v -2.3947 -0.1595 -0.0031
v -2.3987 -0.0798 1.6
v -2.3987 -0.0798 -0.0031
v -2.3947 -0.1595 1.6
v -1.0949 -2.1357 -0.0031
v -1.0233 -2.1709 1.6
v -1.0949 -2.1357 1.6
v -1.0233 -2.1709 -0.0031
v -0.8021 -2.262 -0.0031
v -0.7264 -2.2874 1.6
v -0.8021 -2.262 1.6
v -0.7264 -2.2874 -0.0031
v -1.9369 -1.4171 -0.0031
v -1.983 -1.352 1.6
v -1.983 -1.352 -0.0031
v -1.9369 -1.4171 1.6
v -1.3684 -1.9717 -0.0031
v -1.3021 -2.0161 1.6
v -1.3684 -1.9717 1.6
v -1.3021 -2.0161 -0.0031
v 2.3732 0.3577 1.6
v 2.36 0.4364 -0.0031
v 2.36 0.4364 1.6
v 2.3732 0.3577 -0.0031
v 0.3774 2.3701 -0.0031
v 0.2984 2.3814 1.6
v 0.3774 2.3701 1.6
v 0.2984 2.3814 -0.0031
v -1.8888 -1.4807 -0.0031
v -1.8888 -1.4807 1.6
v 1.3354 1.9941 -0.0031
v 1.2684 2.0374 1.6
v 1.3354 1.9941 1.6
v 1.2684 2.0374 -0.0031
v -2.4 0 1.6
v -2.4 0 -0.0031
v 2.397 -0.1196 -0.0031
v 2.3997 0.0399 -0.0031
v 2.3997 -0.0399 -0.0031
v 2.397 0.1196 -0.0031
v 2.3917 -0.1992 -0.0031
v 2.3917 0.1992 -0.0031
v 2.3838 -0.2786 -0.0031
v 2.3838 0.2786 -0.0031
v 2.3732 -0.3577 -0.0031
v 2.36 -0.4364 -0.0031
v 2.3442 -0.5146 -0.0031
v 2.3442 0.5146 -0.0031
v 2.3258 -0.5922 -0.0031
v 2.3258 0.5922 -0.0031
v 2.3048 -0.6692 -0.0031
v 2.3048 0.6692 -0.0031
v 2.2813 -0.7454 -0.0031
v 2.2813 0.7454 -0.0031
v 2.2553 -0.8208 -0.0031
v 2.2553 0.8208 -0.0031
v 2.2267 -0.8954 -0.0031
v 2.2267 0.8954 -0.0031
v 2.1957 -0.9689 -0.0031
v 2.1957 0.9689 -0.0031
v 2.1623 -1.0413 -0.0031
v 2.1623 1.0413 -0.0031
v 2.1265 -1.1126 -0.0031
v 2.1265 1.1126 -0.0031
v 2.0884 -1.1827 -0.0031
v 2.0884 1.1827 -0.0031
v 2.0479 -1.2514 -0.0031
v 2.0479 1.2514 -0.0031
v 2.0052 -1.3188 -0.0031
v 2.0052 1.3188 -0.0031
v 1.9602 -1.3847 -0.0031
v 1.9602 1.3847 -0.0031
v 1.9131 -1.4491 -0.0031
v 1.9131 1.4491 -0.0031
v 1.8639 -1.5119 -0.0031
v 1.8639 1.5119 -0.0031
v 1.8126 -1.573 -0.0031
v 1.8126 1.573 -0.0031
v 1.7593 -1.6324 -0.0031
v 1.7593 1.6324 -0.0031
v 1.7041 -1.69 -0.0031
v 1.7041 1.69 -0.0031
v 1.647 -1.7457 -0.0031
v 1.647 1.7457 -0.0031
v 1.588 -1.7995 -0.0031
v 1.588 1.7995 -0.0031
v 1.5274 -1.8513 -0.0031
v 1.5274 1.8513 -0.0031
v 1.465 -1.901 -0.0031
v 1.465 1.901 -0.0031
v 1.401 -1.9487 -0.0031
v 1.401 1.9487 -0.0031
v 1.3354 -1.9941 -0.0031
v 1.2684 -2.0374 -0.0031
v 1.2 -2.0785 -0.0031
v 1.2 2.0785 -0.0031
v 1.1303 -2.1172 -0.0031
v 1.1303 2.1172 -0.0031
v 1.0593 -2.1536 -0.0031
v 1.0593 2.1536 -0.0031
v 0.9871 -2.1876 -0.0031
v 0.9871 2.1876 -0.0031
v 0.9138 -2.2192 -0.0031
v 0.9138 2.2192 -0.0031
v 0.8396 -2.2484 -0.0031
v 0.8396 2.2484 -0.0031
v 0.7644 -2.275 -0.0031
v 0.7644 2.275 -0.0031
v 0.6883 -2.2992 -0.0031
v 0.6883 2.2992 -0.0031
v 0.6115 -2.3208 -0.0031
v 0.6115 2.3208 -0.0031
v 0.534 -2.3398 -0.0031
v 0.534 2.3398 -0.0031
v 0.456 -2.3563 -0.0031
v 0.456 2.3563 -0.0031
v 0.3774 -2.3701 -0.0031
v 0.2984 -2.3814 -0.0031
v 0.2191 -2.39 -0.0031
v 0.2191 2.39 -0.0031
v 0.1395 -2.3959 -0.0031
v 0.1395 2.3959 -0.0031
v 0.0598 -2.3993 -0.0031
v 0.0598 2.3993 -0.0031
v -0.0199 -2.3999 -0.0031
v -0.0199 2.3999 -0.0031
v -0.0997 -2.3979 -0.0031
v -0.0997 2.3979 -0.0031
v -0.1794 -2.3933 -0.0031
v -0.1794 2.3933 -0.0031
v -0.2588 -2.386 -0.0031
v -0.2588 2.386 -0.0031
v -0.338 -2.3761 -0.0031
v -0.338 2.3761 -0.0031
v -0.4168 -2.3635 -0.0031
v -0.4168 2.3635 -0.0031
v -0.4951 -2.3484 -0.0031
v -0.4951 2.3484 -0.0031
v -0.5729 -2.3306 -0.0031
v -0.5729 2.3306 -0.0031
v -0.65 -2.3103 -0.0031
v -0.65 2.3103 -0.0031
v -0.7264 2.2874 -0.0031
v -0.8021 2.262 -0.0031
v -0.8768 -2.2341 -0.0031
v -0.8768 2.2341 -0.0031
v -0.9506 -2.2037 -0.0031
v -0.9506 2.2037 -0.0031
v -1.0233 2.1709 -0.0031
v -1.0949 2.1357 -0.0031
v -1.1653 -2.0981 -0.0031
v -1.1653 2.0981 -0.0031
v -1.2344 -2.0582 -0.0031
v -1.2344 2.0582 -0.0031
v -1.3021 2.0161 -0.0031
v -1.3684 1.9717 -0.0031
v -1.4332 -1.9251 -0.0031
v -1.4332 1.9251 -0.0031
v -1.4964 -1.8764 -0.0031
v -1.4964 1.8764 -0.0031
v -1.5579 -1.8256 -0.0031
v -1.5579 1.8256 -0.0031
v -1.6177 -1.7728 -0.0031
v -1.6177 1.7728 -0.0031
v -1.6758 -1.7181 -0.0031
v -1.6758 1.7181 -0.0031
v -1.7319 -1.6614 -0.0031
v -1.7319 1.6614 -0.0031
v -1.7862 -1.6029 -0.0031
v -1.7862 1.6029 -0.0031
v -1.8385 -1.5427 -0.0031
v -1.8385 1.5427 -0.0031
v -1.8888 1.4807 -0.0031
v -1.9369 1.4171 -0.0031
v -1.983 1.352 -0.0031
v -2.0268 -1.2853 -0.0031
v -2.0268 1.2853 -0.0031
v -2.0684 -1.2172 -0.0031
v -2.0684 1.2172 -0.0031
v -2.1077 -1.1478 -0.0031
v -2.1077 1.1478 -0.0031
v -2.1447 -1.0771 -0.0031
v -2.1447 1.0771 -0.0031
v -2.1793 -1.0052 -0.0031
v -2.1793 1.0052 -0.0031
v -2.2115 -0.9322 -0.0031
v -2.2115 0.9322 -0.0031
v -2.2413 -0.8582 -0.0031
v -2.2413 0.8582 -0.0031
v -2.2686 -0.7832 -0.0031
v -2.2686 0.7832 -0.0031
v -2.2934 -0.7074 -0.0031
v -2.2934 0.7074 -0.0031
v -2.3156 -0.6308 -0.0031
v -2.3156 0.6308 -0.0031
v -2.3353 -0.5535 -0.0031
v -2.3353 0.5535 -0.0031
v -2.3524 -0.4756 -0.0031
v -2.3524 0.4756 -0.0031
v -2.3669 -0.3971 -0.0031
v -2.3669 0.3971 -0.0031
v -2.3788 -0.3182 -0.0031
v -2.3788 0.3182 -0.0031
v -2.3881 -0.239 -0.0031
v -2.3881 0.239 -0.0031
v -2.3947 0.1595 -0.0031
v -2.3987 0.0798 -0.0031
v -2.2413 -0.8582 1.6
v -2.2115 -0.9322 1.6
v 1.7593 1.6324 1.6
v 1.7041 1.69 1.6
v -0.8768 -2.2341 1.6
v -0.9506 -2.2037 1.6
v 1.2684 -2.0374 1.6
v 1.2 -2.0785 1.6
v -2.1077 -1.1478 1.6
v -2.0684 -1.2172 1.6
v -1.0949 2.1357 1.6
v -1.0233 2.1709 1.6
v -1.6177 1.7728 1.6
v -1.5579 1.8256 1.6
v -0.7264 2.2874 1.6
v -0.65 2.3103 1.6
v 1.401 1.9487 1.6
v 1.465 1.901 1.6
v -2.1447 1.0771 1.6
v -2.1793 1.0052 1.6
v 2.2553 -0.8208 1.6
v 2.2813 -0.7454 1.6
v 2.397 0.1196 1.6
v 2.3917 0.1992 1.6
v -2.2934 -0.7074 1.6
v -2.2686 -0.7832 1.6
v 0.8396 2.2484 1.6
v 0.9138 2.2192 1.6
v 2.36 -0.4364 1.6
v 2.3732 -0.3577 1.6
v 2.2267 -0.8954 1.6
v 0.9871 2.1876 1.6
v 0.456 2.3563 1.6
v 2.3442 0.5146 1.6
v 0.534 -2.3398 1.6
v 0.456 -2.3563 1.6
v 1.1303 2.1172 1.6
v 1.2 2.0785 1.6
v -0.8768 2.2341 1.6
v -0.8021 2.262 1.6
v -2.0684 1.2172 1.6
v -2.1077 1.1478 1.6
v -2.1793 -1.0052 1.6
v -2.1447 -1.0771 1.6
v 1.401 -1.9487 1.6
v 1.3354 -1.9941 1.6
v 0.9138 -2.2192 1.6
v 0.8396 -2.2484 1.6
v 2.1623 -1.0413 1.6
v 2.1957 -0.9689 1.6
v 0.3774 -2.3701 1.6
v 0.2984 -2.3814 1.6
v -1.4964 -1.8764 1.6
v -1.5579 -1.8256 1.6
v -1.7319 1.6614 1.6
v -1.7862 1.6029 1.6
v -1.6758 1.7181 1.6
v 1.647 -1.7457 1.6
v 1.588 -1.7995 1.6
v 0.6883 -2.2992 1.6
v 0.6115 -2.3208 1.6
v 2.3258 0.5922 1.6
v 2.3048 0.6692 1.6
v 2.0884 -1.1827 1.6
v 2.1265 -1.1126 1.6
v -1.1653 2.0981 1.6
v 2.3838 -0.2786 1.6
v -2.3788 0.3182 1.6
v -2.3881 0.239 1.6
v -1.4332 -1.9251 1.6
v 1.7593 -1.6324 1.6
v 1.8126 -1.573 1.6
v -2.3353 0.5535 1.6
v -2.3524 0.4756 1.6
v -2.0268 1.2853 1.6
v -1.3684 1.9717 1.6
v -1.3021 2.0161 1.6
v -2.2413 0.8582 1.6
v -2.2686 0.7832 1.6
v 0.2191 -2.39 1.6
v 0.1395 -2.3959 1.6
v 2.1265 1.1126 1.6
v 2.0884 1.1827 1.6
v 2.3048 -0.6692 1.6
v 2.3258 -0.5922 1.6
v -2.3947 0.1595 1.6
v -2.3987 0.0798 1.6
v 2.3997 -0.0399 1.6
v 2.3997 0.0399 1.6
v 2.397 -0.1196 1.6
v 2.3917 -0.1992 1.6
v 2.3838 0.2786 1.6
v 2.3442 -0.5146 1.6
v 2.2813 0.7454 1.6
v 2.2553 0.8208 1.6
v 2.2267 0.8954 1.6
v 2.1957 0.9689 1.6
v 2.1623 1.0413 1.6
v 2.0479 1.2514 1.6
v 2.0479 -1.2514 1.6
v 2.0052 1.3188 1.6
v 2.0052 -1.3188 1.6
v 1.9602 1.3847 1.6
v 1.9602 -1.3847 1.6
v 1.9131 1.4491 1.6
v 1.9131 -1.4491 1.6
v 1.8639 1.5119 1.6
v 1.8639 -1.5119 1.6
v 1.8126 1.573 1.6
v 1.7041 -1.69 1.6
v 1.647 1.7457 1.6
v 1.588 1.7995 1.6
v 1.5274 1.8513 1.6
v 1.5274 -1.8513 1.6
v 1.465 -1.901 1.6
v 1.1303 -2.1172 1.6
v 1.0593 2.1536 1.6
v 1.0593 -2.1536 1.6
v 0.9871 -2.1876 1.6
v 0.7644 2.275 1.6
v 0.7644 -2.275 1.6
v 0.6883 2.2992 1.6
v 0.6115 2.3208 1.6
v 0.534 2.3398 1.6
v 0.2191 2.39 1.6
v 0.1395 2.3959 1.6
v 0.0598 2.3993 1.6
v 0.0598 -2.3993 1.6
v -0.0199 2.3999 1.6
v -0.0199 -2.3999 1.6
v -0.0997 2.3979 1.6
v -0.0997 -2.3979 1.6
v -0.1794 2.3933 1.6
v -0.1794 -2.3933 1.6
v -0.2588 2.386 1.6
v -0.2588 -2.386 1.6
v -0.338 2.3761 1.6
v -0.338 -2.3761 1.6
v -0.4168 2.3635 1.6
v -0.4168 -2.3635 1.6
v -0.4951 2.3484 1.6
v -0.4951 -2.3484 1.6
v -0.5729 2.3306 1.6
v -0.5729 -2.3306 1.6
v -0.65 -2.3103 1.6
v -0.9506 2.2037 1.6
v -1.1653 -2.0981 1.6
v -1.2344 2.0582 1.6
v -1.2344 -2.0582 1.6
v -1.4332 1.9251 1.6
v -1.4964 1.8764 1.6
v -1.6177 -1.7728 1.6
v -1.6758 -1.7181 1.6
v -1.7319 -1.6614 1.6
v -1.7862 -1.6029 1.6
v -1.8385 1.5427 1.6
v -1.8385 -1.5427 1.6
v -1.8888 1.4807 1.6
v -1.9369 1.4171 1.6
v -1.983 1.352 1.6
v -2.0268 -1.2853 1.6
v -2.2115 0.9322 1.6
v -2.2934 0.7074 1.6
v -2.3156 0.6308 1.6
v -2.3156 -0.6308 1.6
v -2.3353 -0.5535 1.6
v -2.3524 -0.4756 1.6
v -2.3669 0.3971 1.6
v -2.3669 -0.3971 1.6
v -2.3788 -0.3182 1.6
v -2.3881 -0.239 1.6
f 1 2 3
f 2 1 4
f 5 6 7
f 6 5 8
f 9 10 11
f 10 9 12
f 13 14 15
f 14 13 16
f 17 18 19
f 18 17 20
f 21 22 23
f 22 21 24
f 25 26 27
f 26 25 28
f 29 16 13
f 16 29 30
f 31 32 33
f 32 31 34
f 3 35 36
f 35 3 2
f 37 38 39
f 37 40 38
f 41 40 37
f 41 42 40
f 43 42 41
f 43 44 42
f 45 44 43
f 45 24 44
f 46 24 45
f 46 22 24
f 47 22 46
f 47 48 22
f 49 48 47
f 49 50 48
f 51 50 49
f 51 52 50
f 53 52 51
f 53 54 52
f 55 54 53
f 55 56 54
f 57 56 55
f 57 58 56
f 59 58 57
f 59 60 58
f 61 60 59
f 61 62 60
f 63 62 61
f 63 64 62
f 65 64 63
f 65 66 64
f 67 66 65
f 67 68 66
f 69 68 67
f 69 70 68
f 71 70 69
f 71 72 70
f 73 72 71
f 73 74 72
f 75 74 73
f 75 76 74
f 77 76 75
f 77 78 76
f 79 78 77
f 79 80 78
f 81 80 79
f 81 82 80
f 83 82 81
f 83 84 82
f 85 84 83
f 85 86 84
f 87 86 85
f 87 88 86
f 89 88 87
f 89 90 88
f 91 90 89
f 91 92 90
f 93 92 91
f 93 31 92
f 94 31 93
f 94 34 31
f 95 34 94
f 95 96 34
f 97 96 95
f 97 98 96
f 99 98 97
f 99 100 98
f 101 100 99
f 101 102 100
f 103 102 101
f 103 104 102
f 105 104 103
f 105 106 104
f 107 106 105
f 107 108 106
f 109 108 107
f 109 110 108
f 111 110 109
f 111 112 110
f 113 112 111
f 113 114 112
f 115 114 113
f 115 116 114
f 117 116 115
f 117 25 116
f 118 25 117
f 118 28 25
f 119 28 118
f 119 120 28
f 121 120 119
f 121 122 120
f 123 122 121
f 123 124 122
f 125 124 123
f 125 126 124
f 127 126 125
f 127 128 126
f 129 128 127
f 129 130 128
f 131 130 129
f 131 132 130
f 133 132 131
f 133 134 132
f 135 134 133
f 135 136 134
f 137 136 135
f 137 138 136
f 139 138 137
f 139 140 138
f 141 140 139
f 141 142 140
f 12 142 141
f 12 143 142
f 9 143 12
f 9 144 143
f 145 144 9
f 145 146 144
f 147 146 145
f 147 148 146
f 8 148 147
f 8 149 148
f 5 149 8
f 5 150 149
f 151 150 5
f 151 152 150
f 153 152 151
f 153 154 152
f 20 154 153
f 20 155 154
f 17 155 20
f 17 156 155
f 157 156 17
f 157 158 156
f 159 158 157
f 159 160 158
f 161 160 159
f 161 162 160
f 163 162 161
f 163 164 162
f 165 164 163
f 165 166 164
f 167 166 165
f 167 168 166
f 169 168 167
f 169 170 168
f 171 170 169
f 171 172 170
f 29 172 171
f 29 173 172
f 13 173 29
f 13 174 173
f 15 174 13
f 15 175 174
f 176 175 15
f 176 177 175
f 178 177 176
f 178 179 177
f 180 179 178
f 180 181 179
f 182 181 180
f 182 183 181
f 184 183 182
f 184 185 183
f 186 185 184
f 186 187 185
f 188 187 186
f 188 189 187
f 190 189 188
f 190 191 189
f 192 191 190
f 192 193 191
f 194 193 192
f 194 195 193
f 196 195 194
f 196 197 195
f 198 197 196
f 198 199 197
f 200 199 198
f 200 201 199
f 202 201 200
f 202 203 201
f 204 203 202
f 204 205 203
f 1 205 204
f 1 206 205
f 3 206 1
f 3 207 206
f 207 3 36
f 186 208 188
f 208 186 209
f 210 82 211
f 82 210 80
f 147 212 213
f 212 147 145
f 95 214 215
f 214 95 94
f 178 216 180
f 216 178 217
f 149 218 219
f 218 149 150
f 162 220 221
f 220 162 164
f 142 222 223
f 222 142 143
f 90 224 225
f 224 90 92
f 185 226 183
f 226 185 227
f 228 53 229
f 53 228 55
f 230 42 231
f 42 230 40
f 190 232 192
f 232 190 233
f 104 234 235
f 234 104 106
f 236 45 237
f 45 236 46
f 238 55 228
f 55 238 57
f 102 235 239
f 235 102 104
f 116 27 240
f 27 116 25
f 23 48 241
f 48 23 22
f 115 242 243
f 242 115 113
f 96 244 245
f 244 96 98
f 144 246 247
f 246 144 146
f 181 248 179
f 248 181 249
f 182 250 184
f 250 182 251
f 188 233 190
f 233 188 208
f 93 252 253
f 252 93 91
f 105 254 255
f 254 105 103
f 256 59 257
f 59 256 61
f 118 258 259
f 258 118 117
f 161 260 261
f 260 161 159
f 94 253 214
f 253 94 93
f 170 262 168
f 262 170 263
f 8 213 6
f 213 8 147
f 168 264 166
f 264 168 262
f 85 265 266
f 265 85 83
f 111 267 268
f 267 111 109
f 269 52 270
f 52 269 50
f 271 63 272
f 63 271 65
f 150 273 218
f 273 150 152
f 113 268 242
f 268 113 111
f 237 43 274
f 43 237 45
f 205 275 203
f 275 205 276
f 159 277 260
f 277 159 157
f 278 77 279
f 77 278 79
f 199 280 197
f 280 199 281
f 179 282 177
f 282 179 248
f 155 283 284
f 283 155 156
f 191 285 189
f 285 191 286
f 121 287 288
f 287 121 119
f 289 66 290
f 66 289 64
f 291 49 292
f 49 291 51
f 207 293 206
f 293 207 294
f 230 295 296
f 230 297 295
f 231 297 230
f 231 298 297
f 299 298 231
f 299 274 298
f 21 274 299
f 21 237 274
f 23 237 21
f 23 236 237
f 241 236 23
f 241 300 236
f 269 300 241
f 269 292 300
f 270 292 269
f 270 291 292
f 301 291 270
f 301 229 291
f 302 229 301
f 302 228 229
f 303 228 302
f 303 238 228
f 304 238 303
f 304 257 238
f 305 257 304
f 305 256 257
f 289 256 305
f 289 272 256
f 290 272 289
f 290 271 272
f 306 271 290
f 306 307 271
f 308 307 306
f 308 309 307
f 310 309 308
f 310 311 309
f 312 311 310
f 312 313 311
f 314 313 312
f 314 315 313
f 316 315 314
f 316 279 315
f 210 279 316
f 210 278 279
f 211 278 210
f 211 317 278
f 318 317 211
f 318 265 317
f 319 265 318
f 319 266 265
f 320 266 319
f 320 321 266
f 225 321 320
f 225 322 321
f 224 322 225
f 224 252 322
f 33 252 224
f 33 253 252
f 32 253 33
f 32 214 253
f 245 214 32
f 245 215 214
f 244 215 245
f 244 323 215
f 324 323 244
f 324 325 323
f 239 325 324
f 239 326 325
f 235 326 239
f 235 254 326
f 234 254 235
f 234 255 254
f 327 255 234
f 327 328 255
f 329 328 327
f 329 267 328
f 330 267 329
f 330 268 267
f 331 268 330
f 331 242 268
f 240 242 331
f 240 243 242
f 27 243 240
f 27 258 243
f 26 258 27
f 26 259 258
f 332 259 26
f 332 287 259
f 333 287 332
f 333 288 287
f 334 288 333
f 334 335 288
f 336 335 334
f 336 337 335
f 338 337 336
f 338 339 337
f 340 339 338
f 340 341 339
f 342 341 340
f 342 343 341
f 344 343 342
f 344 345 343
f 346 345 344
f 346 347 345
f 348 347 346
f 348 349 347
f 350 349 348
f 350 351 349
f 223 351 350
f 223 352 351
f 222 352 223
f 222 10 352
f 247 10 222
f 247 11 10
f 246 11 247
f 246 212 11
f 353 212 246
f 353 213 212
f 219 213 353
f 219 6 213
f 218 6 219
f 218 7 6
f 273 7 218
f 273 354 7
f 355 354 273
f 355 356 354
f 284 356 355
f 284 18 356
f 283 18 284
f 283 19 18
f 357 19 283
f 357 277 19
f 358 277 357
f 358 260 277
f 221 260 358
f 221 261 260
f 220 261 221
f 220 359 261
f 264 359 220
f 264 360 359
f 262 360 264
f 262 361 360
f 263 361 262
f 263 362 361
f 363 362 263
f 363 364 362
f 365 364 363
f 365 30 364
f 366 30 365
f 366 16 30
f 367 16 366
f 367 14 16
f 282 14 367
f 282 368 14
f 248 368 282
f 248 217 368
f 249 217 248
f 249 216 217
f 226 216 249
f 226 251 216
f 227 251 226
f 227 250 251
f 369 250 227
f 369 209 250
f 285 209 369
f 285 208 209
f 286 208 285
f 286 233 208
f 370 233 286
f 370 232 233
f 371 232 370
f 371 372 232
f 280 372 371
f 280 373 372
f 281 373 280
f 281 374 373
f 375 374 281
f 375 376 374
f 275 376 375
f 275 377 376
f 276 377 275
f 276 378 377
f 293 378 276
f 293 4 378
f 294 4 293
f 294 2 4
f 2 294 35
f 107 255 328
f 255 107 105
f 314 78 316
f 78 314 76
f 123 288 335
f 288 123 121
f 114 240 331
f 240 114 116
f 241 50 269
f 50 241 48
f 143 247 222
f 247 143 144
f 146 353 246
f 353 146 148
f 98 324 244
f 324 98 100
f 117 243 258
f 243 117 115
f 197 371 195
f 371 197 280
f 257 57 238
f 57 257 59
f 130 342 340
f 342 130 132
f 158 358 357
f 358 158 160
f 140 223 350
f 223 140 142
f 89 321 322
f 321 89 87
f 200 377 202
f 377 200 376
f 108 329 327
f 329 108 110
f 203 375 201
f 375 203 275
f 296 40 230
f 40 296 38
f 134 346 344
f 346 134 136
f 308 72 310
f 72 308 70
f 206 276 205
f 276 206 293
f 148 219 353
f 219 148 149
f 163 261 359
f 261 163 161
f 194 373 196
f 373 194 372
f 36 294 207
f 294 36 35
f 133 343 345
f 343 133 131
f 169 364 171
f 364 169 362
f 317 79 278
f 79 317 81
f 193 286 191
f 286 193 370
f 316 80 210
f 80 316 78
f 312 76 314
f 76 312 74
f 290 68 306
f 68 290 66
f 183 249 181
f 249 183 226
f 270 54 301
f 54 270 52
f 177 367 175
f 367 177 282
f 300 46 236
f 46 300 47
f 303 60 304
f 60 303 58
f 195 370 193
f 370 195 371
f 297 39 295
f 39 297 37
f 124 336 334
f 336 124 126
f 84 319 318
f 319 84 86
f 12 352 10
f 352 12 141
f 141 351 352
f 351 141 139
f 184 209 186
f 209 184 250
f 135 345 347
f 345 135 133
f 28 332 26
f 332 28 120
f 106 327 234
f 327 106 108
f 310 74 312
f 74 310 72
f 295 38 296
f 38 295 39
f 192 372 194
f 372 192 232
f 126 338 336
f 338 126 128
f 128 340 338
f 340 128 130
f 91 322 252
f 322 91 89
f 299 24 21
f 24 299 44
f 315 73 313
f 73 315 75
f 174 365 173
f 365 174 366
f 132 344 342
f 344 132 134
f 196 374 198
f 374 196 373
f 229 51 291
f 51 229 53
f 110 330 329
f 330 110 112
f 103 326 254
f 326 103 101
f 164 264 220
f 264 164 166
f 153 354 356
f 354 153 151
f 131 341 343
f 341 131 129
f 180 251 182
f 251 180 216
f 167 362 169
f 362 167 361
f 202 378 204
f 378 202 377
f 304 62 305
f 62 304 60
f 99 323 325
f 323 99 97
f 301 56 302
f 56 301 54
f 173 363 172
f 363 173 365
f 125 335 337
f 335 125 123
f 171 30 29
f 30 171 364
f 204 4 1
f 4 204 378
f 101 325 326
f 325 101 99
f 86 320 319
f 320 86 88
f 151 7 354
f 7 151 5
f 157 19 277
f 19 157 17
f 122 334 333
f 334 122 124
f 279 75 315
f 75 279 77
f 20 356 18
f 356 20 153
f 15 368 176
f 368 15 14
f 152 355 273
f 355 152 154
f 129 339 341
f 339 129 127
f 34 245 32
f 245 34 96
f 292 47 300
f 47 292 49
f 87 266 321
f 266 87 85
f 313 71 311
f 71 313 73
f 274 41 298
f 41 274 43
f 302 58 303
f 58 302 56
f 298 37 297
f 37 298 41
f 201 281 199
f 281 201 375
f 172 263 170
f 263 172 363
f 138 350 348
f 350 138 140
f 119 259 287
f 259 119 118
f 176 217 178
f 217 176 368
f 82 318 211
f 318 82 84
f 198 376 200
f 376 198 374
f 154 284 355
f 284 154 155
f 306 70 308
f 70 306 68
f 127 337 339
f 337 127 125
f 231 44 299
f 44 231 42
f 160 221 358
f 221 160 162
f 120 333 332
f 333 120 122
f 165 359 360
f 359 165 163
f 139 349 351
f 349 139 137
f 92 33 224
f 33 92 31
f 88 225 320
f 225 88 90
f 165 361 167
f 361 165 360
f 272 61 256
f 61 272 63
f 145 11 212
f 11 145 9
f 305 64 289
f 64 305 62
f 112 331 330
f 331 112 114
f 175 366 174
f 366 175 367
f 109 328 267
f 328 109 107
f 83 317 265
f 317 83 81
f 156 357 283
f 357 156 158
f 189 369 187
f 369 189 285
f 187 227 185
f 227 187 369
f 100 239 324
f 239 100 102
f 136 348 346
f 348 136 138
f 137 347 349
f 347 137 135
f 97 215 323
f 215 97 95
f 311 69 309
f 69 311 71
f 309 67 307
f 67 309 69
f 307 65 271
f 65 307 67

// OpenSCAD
// file: ../p/4-4edge.scad
use <../lib.scad>
$fa=1; $fs=0.2;
function ldraw_lib__4_4edge(realsolid=false) = [
// 0 Circle 1.0
// 0 Name: 4-4edge.dat
// 0 Author: James Jessiman
// 0 !LDRAW_ORG Primitive UPDATE 2017-01
// 0 !LICENSE Licensed under CC BY 2.0 and CC BY 4.0 : see CAreadme.txt
// 
// 0 BFC CERTIFY CCW
  [0,"BFC","CERTIFY"],
  [0,"BFC","CCW"],
// 
// 0 !HISTORY 1998-12-15 [PTadmin] Official Update 1998-10
// 0 !HISTORY 2005-12-28 [PTadmin] Official Update 2005-01
// 0 !HISTORY 2007-06-24 [PTadmin] Header formatted for Contributor Agreement
// 0 !HISTORY 2008-07-01 [PTadmin] Official Update 2008-01
// 0 !HISTORY 2017-01-15 [Steffen] BFCed
// 0 !HISTORY 2017-12-30 [PTadmin] Official Update 2017-01
// 
// 
// 2 24 1 0 0 0.9239 0 0.3827
  [2,24,1,0,0,0.9239,0,0.3827],
// 2 24 0.9239 0 0.3827 0.7071 0 0.7071
  [2,24,0.9239,0,0.3827,0.7071,0,0.7071],
// 2 24 0.7071 0 0.7071 0.3827 0 0.9239
  [2,24,0.7071,0,0.7071,0.3827,0,0.9239],
// 2 24 0.3827 0 0.9239 0 0 1
  [2,24,0.3827,0,0.9239,0,0,1],
// 2 24 0 0 1 -0.3827 0 0.9239
  [2,24,0,0,1,-0.3827,0,0.9239],
// 2 24 -0.3827 0 0.9239 -0.7071 0 0.7071
  [2,24,-0.3827,0,0.9239,-0.7071,0,0.7071],
// 2 24 -0.7071 0 0.7071 -0.9239 0 0.3827
  [2,24,-0.7071,0,0.7071,-0.9239,0,0.3827],
// 2 24 -0.9239 0 0.3827 -1 0 -0
  [2,24,-0.9239,0,0.3827,-1,0,-0],
// 2 24 -1 0 -0 -0.9239 0 -0.3827
  [2,24,-1,0,-0,-0.9239,0,-0.3827],
// 2 24 -0.9239 0 -0.3827 -0.7071 0 -0.7071
  [2,24,-0.9239,0,-0.3827,-0.7071,0,-0.7071],
// 2 24 -0.7071 0 -0.7071 -0.3827 0 -0.9239
  [2,24,-0.7071,0,-0.7071,-0.3827,0,-0.9239],
// 2 24 -0.3827 0 -0.9239 0 0 -1
  [2,24,-0.3827,0,-0.9239,0,0,-1],
// 2 24 0 0 -1 0.3827 0 -0.9239
  [2,24,0,0,-1,0.3827,0,-0.9239],
// 2 24 0.3827 0 -0.9239 0.7071 0 -0.7071
  [2,24,0.3827,0,-0.9239,0.7071,0,-0.7071],
// 2 24 0.7071 0 -0.7071 0.9239 0 -0.3827
  [2,24,0.7071,0,-0.7071,0.9239,0,-0.3827],
// 2 24 0.9239 0 -0.3827 1 0 0
  [2,24,0.9239,0,-0.3827,1,0,0],
];
module ldraw_lib__4_4edge(step=0, col=false, unit=2/5, alt=false, line=0.2, solid=!$preview)
    makepoly(ldraw_lib__4_4edge(solid), step=step, col=col, unit=unit, alt=alt, line=line, solid=solid);
ldraw_lib__4_4edge(line=0.2);
// file: ../p/4-4disc.scad
use <../lib.scad>
$fa=1; $fs=0.2;
function ldraw_lib__4_4disc(realsolid=false) = [
// 0 Disc 1.0
// 0 Name: 4-4disc.dat
// 0 Author: James Jessiman
// 0 !LDRAW_ORG Primitive UPDATE 2002-02
// 0 !LICENSE Licensed under CC BY 2.0 and CC BY 4.0 : see CAreadme.txt
// 
// 0 BFC CERTIFY CCW
  [0,"BFC","CERTIFY"],
  [0,"BFC","CCW"],
// 
// 0 !HISTORY 1998-12-15 [PTadmin] Official Update 1998-10
// 0 !HISTORY 2002-03-23 [sbliss] Added BFC statement
// 0 !HISTORY 2002-04-25 [PTadmin] Official Update 2002-02
// 0 !HISTORY 2007-06-24 [PTadmin] Header formatted for Contributor Agreement
// 0 !HISTORY 2008-07-01 [PTadmin] Official Update 2008-01
// 
// 
// 3 16 0 0 0 1 0 0 0.9239 0 0.3827
  [3,16,0,0,0,1,0,0,0.9239,0,0.3827],
// 3 16 0 0 0 0.9239 0 0.3827 0.7071 0 0.7071
  [3,16,0,0,0,0.9239,0,0.3827,0.7071,0,0.7071],
// 3 16 0 0 0 0.7071 0 0.7071 0.3827 0 0.9239
  [3,16,0,0,0,0.7071,0,0.7071,0.3827,0,0.9239],
// 3 16 0 0 0 0.3827 0 0.9239 0 0 1
  [3,16,0,0,0,0.3827,0,0.9239,0,0,1],
// 3 16 0 0 0 0 0 1 -0.3827 0 0.9239
  [3,16,0,0,0,0,0,1,-0.3827,0,0.9239],
// 3 16 0 0 0 -0.3827 0 0.9239 -0.7071 0 0.7071
  [3,16,0,0,0,-0.3827,0,0.9239,-0.7071,0,0.7071],
// 3 16 0 0 0 -0.7071 0 0.7071 -0.9239 0 0.3827
  [3,16,0,0,0,-0.7071,0,0.7071,-0.9239,0,0.3827],
// 3 16 0 0 0 -0.9239 0 0.3827 -1 0 -0
  [3,16,0,0,0,-0.9239,0,0.3827,-1,0,-0],
// 3 16 0 0 0 -1 0 -0 -0.9239 0 -0.3827
  [3,16,0,0,0,-1,0,-0,-0.9239,0,-0.3827],
// 3 16 0 0 0 -0.9239 0 -0.3827 -0.7071 0 -0.7071
  [3,16,0,0,0,-0.9239,0,-0.3827,-0.7071,0,-0.7071],
// 3 16 0 0 0 -0.7071 0 -0.7071 -0.3827 0 -0.9239
  [3,16,0,0,0,-0.7071,0,-0.7071,-0.3827,0,-0.9239],
// 3 16 0 0 0 -0.3827 0 -0.9239 0 0 -1
  [3,16,0,0,0,-0.3827,0,-0.9239,0,0,-1],
// 3 16 0 0 0 0 0 -1 0.3827 0 -0.9239
  [3,16,0,0,0,0,0,-1,0.3827,0,-0.9239],
// 3 16 0 0 0 0.3827 0 -0.9239 0.7071 0 -0.7071
  [3,16,0,0,0,0.3827,0,-0.9239,0.7071,0,-0.7071],
// 3 16 0 0 0 0.7071 0 -0.7071 0.9239 0 -0.3827
  [3,16,0,0,0,0.7071,0,-0.7071,0.9239,0,-0.3827],
// 3 16 0 0 0 0.9239 0 -0.3827 1 0 0
  [3,16,0,0,0,0.9239,0,-0.3827,1,0,0],
// 0
];
module ldraw_lib__4_4disc(step=0, col=false, unit=2/5, alt=false, line=0.2, solid=!$preview)
    makepoly(ldraw_lib__4_4disc(solid), step=step, col=col, unit=unit, alt=alt, line=line, solid=solid);
ldraw_lib__4_4disc(line=0.2);
// file: ../p/4-4cyli.scad
use <../lib.scad>
$fa=1; $fs=0.2;
function ldraw_lib__4_4cyli(realsolid=false) = [
// 0 Cylinder 1.0
// 0 Name: 4-4cyli.dat
// 0 Author: James Jessiman
// 0 !LDRAW_ORG Primitive UPDATE 2005-01
// 0 !LICENSE Licensed under CC BY 2.0 and CC BY 4.0 : see CAreadme.txt
// 
// 0 BFC CERTIFY CCW
  [0,"BFC","CERTIFY"],
  [0,"BFC","CCW"],
// 
// 0 !HISTORY 1998-12-15 [PTadmin] Official Update 1998-10
// 0 !HISTORY 2002-03-23 [sbliss] Added BFC statement; merged headers from files in distributions LDraw 0.27 and Complete.
// 0 !HISTORY 2002-04-25 [PTadmin] Official Update 2002-02
// 0 !HISTORY 2004-12-14 [guyvivan] BFC CCW
// 0 !HISTORY 2005-12-28 [PTadmin] Official Update 2005-01
// 0 !HISTORY 2007-06-24 [PTadmin] Header formatted for Contributor Agreement
// 0 !HISTORY 2008-07-01 [PTadmin] Official Update 2008-01
// 
// 
// 4 16 1 1 0 0.9239 1 0.3827 0.9239 0 0.3827 1 0 0
  [4,16,1,1,0,0.9239,1,0.3827,0.9239,0,0.3827,1,0,0],
// 5 24 1 0 0 1 1 0 0.9239 0 0.3827 0.9239 0 -0.3827
  [5,24,1,0,0,1,1,0,0.9239,0,0.3827,0.9239,0,-0.3827],
// 4 16 0.9239 1 0.3827 0.7071 1 0.7071 0.7071 0 0.7071 0.9239 0 0.3827
  [4,16,0.9239,1,0.3827,0.7071,1,0.7071,0.7071,0,0.7071,0.9239,0,0.3827],
// 5 24 0.9239 0 0.3827 0.9239 1 0.3827 0.7071 0 0.7071 1 0 0
  [5,24,0.9239,0,0.3827,0.9239,1,0.3827,0.7071,0,0.7071,1,0,0],
// 4 16 0.7071 1 0.7071 0.3827 1 0.9239 0.3827 0 0.9239 0.7071 0 0.7071
  [4,16,0.7071,1,0.7071,0.3827,1,0.9239,0.3827,0,0.9239,0.7071,0,0.7071],
// 5 24 0.7071 0 0.7071 0.7071 1 0.7071 0.3827 0 0.9239 0.9239 0 0.3827
  [5,24,0.7071,0,0.7071,0.7071,1,0.7071,0.3827,0,0.9239,0.9239,0,0.3827],
// 4 16 0.3827 1 0.9239 0 1 1 0 0 1 0.3827 0 0.9239
  [4,16,0.3827,1,0.9239,0,1,1,0,0,1,0.3827,0,0.9239],
// 5 24 0.3827 0 0.9239 0.3827 1 0.9239 0 0 1 0.7071 0 0.7071
  [5,24,0.3827,0,0.9239,0.3827,1,0.9239,0,0,1,0.7071,0,0.7071],
// 4 16 0 1 1 -0.3827 1 0.9239 -0.3827 0 0.9239 0 0 1
  [4,16,0,1,1,-0.3827,1,0.9239,-0.3827,0,0.9239,0,0,1],
// 5 24 0 0 1 0 1 1 -0.3827 0 0.9239 0.3827 0 0.9239
  [5,24,0,0,1,0,1,1,-0.3827,0,0.9239,0.3827,0,0.9239],
// 4 16 -0.3827 1 0.9239 -0.7071 1 0.7071 -0.7071 0 0.7071 -0.3827 0 0.9239
  [4,16,-0.3827,1,0.9239,-0.7071,1,0.7071,-0.7071,0,0.7071,-0.3827,0,0.9239],
// 5 24 -0.3827 0 0.9239 -0.3827 1 0.9239 -0.7071 0 0.7071 0 0 1
  [5,24,-0.3827,0,0.9239,-0.3827,1,0.9239,-0.7071,0,0.7071,0,0,1],
// 4 16 -0.7071 1 0.7071 -0.9239 1 0.3827 -0.9239 0 0.3827 -0.7071 0 0.7071
  [4,16,-0.7071,1,0.7071,-0.9239,1,0.3827,-0.9239,0,0.3827,-0.7071,0,0.7071],
// 5 24 -0.7071 0 0.7071 -0.7071 1 0.7071 -0.9239 0 0.3827 -0.3827 0 0.9239
  [5,24,-0.7071,0,0.7071,-0.7071,1,0.7071,-0.9239,0,0.3827,-0.3827,0,0.9239],
// 4 16 -0.9239 1 0.3827 -1 1 0 -1 0 0 -0.9239 0 0.3827
  [4,16,-0.9239,1,0.3827,-1,1,0,-1,0,0,-0.9239,0,0.3827],
// 5 24 -0.9239 0 0.3827 -0.9239 1 0.3827 -1 0 0 -0.7071 0 0.7071
  [5,24,-0.9239,0,0.3827,-0.9239,1,0.3827,-1,0,0,-0.7071,0,0.7071],
// 4 16 -1 1 0 -0.9239 1 -0.3827 -0.9239 0 -0.3827 -1 0 0
  [4,16,-1,1,0,-0.9239,1,-0.3827,-0.9239,0,-0.3827,-1,0,0],
// 5 24 -1 0 0 -1 1 0 -0.9239 0 -0.3827 -0.9239 0 0.3827
  [5,24,-1,0,0,-1,1,0,-0.9239,0,-0.3827,-0.9239,0,0.3827],
// 4 16 -0.9239 1 -0.3827 -0.7071 1 -0.7071 -0.7071 0 -0.7071 -0.9239 0 -0.3827
  [4,16,-0.9239,1,-0.3827,-0.7071,1,-0.7071,-0.7071,0,-0.7071,-0.9239,0,-0.3827],
// 5 24 -0.9239 0 -0.3827 -0.9239 1 -0.3827 -0.7071 0 -0.7071 -1 0 0
  [5,24,-0.9239,0,-0.3827,-0.9239,1,-0.3827,-0.7071,0,-0.7071,-1,0,0],
// 4 16 -0.7071 1 -0.7071 -0.3827 1 -0.9239 -0.3827 0 -0.9239 -0.7071 0 -0.7071
  [4,16,-0.7071,1,-0.7071,-0.3827,1,-0.9239,-0.3827,0,-0.9239,-0.7071,0,-0.7071],
// 5 24 -0.7071 0 -0.7071 -0.7071 1 -0.7071 -0.3827 0 -0.9239 -0.9239 0 -0.3827
  [5,24,-0.7071,0,-0.7071,-0.7071,1,-0.7071,-0.3827,0,-0.9239,-0.9239,0,-0.3827],
// 4 16 -0.3827 1 -0.9239 0 1 -1 0 0 -1 -0.3827 0 -0.9239
  [4,16,-0.3827,1,-0.9239,0,1,-1,0,0,-1,-0.3827,0,-0.9239],
// 5 24 -0.3827 0 -0.9239 -0.3827 1 -0.9239 0 0 -1 -0.7071 0 -0.7071
  [5,24,-0.3827,0,-0.9239,-0.3827,1,-0.9239,0,0,-1,-0.7071,0,-0.7071],
// 4 16 0 1 -1 0.3827 1 -0.9239 0.3827 0 -0.9239 0 0 -1
  [4,16,0,1,-1,0.3827,1,-0.9239,0.3827,0,-0.9239,0,0,-1],
// 5 24 0 0 -1 0 1 -1 0.3827 0 -0.9239 -0.3827 0 -0.9239
  [5,24,0,0,-1,0,1,-1,0.3827,0,-0.9239,-0.3827,0,-0.9239],
// 4 16 0.3827 1 -0.9239 0.7071 1 -0.7071 0.7071 0 -0.7071 0.3827 0 -0.9239
  [4,16,0.3827,1,-0.9239,0.7071,1,-0.7071,0.7071,0,-0.7071,0.3827,0,-0.9239],
// 5 24 0.3827 0 -0.9239 0.3827 1 -0.9239 0.7071 0 -0.7071 0 0 -1
  [5,24,0.3827,0,-0.9239,0.3827,1,-0.9239,0.7071,0,-0.7071,0,0,-1],
// 4 16 0.7071 1 -0.7071 0.9239 1 -0.3827 0.9239 0 -0.3827 0.7071 0 -0.7071
  [4,16,0.7071,1,-0.7071,0.9239,1,-0.3827,0.9239,0,-0.3827,0.7071,0,-0.7071],
// 5 24 0.7071 0 -0.7071 0.7071 1 -0.7071 0.9239 0 -0.3827 0.3827 0 -0.9239
  [5,24,0.7071,0,-0.7071,0.7071,1,-0.7071,0.9239,0,-0.3827,0.3827,0,-0.9239],
// 4 16 0.9239 1 -0.3827 1 1 0 1 0 0 0.9239 0 -0.3827
  [4,16,0.9239,1,-0.3827,1,1,0,1,0,0,0.9239,0,-0.3827],
// 5 24 0.9239 0 -0.3827 0.9239 1 -0.3827 1 0 0 0.7071 0 -0.7071
  [5,24,0.9239,0,-0.3827,0.9239,1,-0.3827,1,0,0,0.7071,0,-0.7071],
// 0
];
module ldraw_lib__4_4cyli(step=0, col=false, unit=2/5, alt=false, line=0.2, solid=!$preview)
    makepoly(ldraw_lib__4_4cyli(solid), step=step, col=col, unit=unit, alt=alt, line=line, solid=solid);
ldraw_lib__4_4cyli(line=0.2);
// file: ../p/stud3.scad
use <../lib.scad>
use <4-4cyli.scad>
use <4-4disc.scad>
use <4-4edge.scad>
$fa=1; $fs=0.2;
function ldraw_lib__stud3(realsolid=false) = realsolid ? 
    [openscad(translate([0,0,-eps()], o=cylinder(4+eps(), r=4)),2)] : [
// 0 Stud Tube Solid
// 0 Name: stud3.dat
// 0 Author: James Jessiman
// 0 !LDRAW_ORG Primitive UPDATE 2012-01
// 0 !LICENSE Licensed under CC BY 2.0 and CC BY 4.0 : see CAreadme.txt
// 
// 0 BFC CERTIFY CCW
  [0,"BFC","CERTIFY"],
  [0,"BFC","CCW"],
// 
// 0 !HISTORY 2002-04-04 [sbliss] Modified for BFC compliance
// 0 !HISTORY 2002-04-25 [PTadmin] Official Update 2002-02
// 0 !HISTORY 2007-06-24 [PTadmin] Header formatted for Contributor Agreement
// 0 !HISTORY 2008-07-01 [PTadmin] Official Update 2008-01
// 0 !HISTORY 2012-02-16 [Philo] Changed to CCW
// 0 !HISTORY 2012-03-30 [PTadmin] Official Update 2012-01
// 
// 
// 1 16 0 -4 0 4 0 0 0 1 0 0 0 4 4-4edge.dat
  [1,16,0,-4,0,4,0,0,0,1,0,0,0,4, ldraw_lib__4_4edge(realsolid)],
// 1 16 0 0 0 4 0 0 0 1 0 0 0 4 4-4edge.dat
  [1,16,0,0,0,4,0,0,0,1,0,0,0,4, ldraw_lib__4_4edge(realsolid)],
// 1 16 0 -4 0 4 0 0 0 1 0 0 0 4 4-4disc.dat
  [1,16,0,-4,0,4,0,0,0,1,0,0,0,4, ldraw_lib__4_4disc(realsolid)],
// 1 16 0 -4 0 4 0 0 0 4 0 0 0 4 4-4cyli.dat
  [1,16,0,-4,0,4,0,0,0,4,0,0,0,4, ldraw_lib__4_4cyli(realsolid)],
];
module ldraw_lib__stud3(step=0, col=false, unit=2/5, alt=false, line=0.2, solid=!$preview)
    makepoly(ldraw_lib__stud3(solid), step=step, col=col, unit=unit, alt=alt, line=line, solid=solid);
ldraw_lib__stud3(line=0.2);
// file: ../p/stud.scad
use <../lib.scad>
use <4-4cyli.scad>
use <4-4disc.scad>
use <4-4edge.scad>
$fa=1; $fs=0.2;
function ldraw_lib__stud(realsolid=false) = realsolid ? 
    [openscad(translate([0,0,-eps()], o=cylinder(4+eps(), r=6)),2)] : [
// 0 Stud
// 0 Name: stud.dat
// 0 Author: James Jessiman
// 0 !LDRAW_ORG Primitive UPDATE 2012-01
// 0 !LICENSE Licensed under CC BY 2.0 and CC BY 4.0 : see CAreadme.txt
// 
// 0 BFC CERTIFY CCW
  [0,"BFC","CERTIFY"],
  [0,"BFC","CCW"],
// 
// 0 !HISTORY 2002-04-04 [sbliss] Modified for BFC compliance
// 0 !HISTORY 2002-04-25 [PTadmin] Official Update 2002-02
// 0 !HISTORY 2007-06-24 [PTadmin] Header formatted for Contributor Agreement
// 0 !HISTORY 2008-07-01 [PTadmin] Official Update 2008-01
// 0 !HISTORY 2012-02-16 [Philo] Changed to CCW
// 0 !HISTORY 2012-03-30 [PTadmin] Official Update 2012-01
// 
// 
// 1 16 0 0 0 6 0 0 0 1 0 0 0 6 4-4edge.dat
  [1,16,0,0,0,6,0,0,0,1,0,0,0,6, ldraw_lib__4_4edge(realsolid)],
// 1 16 0 -4 0 6 0 0 0 1 0 0 0 6 4-4edge.dat
  [1,16,0,-4,0,6,0,0,0,1,0,0,0,6, ldraw_lib__4_4edge(realsolid)],
// 1 16 0 0 0 6 0 0 0 -4 0 0 0 6 4-4cyli.dat
  [1,16,0,0,0,6,0,0,0,-4,0,0,0,6, ldraw_lib__4_4cyli(realsolid)],
// 1 16 0 -4 0 6 0 0 0 1 0 0 0 6 4-4disc.dat
  [1,16,0,-4,0,6,0,0,0,1,0,0,0,6, ldraw_lib__4_4disc(realsolid)],
];
module ldraw_lib__stud(step=0, col=false, unit=2/5, alt=false, line=0.2, solid=!$preview)
    makepoly(ldraw_lib__stud(solid), step=step, col=col, unit=unit, alt=alt, line=line, solid=solid);
ldraw_lib__stud(line=0.2);
// file: ../p/box5.scad
use <../lib.scad>
$fa=1; $fs=0.2;
function ldraw_lib__box5(realsolid=false) = [
// 0 Box with 5 Faces and All Edges
// 0 Name: box5.dat
// 0 Author: James Jessiman
// 0 !LDRAW_ORG Primitive UPDATE 2012-01
// 0 !LICENSE Licensed under CC BY 2.0 and CC BY 4.0 : see CAreadme.txt
// 
// 0 BFC CERTIFY CCW
  [0,"BFC","CERTIFY"],
  [0,"BFC","CCW"],
// 
// 0 !HISTORY 2002-04-03 [sbliss] Modified for BFC compliance
// 0 !HISTORY 2002-04-25 [PTadmin] Official Update 2002-02
// 0 !HISTORY 2007-06-24 [PTadmin] Header formatted for Contributor Agreement
// 0 !HISTORY 2008-07-01 [PTadmin] Official Update 2008-01
// 0 !HISTORY 2012-02-16 [Philo] Changed to CCW
// 0 !HISTORY 2012-03-30 [PTadmin] Official Update 2012-01
// 
// 
// 2 24 1 1 1 -1 1 1
  [2,24,1,1,1,-1,1,1],
// 2 24 -1 1 1 -1 1 -1
  [2,24,-1,1,1,-1,1,-1],
// 2 24 -1 1 -1 1 1 -1
  [2,24,-1,1,-1,1,1,-1],
// 2 24 1 1 -1 1 1 1
  [2,24,1,1,-1,1,1,1],
// 2 24 1 0 1 -1 0 1
  [2,24,1,0,1,-1,0,1],
// 2 24 -1 0 1 -1 0 -1
  [2,24,-1,0,1,-1,0,-1],
// 2 24 -1 0 -1 1 0 -1
  [2,24,-1,0,-1,1,0,-1],
// 2 24 1 0 -1 1 0 1
  [2,24,1,0,-1,1,0,1],
// 2 24 1 0 1 1 1 1
  [2,24,1,0,1,1,1,1],
// 2 24 -1 0 1 -1 1 1
  [2,24,-1,0,1,-1,1,1],
// 2 24 1 0 -1 1 1 -1
  [2,24,1,0,-1,1,1,-1],
// 2 24 -1 0 -1 -1 1 -1
  [2,24,-1,0,-1,-1,1,-1],
// 4 16 -1 1 1 1 1 1 1 1 -1 -1 1 -1
  [4,16,-1,1,1,1,1,1,1,1,-1,-1,1,-1],
// 4 16 -1 1 1 -1 0 1 1 0 1 1 1 1
  [4,16,-1,1,1,-1,0,1,1,0,1,1,1,1],
// 4 16 -1 1 -1 -1 0 -1 -1 0 1 -1 1 1
  [4,16,-1,1,-1,-1,0,-1,-1,0,1,-1,1,1],
// 4 16 1 1 -1 1 0 -1 -1 0 -1 -1 1 -1
  [4,16,1,1,-1,1,0,-1,-1,0,-1,-1,1,-1],
// 4 16 1 1 1 1 0 1 1 0 -1 1 1 -1
  [4,16,1,1,1,1,0,1,1,0,-1,1,1,-1],
];
module ldraw_lib__box5(step=0, col=false, unit=2/5, alt=false, line=0.2, solid=!$preview)
    makepoly(ldraw_lib__box5(solid), step=step, col=col, unit=unit, alt=alt, line=line, solid=solid);
ldraw_lib__box5(line=0.2);
// file: ../p/box4t.scad
use <../lib.scad>
$fa=1; $fs=0.2;
function ldraw_lib__box4t(realsolid=false) = [
// 0 Box with 4 Adjacent Faces and All Edges
// 0 Name: box4t.dat
// 0 Author: Tore Eriksson [Tore_Eriksson]
// 0 !LDRAW_ORG Primitive UPDATE 2003-02
// 0 !LICENSE Licensed under CC BY 2.0 and CC BY 4.0 : see CAreadme.txt
// 
// 0 BFC CERTIFY CCW
  [0,"BFC","CERTIFY"],
  [0,"BFC","CCW"],
// 
// 0 !HISTORY 1997-09-29 [PTadmin] Official Update 1997-15
// 0 !HISTORY 2002-08-31 [izanette] Modified with WINDZ for BFC compliance
// 0 !HISTORY 2003-08-01 [PTadmin] Official Update 2003-02
// 0 !HISTORY 2007-06-24 [PTadmin] Header formatted for Contributor Agreement
// 0 !HISTORY 2008-07-01 [PTadmin] Official Update 2008-01
// 
// 
// 2 24 1 1 1 -1 1 1
  [2,24,1,1,1,-1,1,1],
// 2 24 -1 1 1 -1 1 -1
  [2,24,-1,1,1,-1,1,-1],
// 2 24 -1 1 -1 1 1 -1
  [2,24,-1,1,-1,1,1,-1],
// 2 24 1 1 -1 1 1 1
  [2,24,1,1,-1,1,1,1],
// 2 24 1 0 1 -1 0 1
  [2,24,1,0,1,-1,0,1],
// 2 24 -1 0 1 -1 0 -1
  [2,24,-1,0,1,-1,0,-1],
// 2 24 -1 0 -1 1 0 -1
  [2,24,-1,0,-1,1,0,-1],
// 2 24 1 0 -1 1 0 1
  [2,24,1,0,-1,1,0,1],
// 2 24 1 0 1 1 1 1
  [2,24,1,0,1,1,1,1],
// 2 24 -1 0 1 -1 1 1
  [2,24,-1,0,1,-1,1,1],
// 2 24 1 0 -1 1 1 -1
  [2,24,1,0,-1,1,1,-1],
// 2 24 -1 0 -1 -1 1 -1
  [2,24,-1,0,-1,-1,1,-1],
// 4 16 1 1 1 1 1 -1 -1 1 -1 -1 1 1
  [4,16,1,1,1,1,1,-1,-1,1,-1,-1,1,1],
// 4 16 1 1 1 -1 1 1 -1 0 1 1 0 1
  [4,16,1,1,1,-1,1,1,-1,0,1,1,0,1],
// 4 16 -1 1 1 -1 1 -1 -1 0 -1 -1 0 1
  [4,16,-1,1,1,-1,1,-1,-1,0,-1,-1,0,1],
// 0 4 16 -1 1 -1 -1 0 -1 1 0 -1 1 1 -1
// 4 16 1 1 -1 1 1 1 1 0 1 1 0 -1
  [4,16,1,1,-1,1,1,1,1,0,1,1,0,-1],
// 0
];
module ldraw_lib__box4t(step=0, col=false, unit=2/5, alt=false, line=0.2, solid=!$preview)
    makepoly(ldraw_lib__box4t(solid), step=step, col=col, unit=unit, alt=alt, line=line, solid=solid);
ldraw_lib__box4t(line=0.2);
// file: s/3004s01.scad
use <../../lib.scad>
use <../../p/box4t.scad>
use <../../p/box5.scad>
use <../../p/stud.scad>
use <../../p/stud3.scad>
$fa=1; $fs=0.2;
function ldraw_lib__s__3004s01(realsolid=false) = [
// 0 ~Brick  1 x  2 without Front Face
// 0 Name: s\3004s01.dat
// 0 Author: James Jessiman
// 0 !LDRAW_ORG Subpart UPDATE 2003-03
// 0 !LICENSE Licensed under CC BY 2.0 and CC BY 4.0 : see CAreadme.txt
// 
// 0 BFC CERTIFY CCW
  [0,"BFC","CERTIFY"],
  [0,"BFC","CCW"],
// 
// 0 !HISTORY 2003-09-07 [jriley] Subfiling, BFC
// 0 !HISTORY 2003-12-19 [PTadmin] Official Update 2003-03
// 0 !HISTORY 2007-08-29 [PTadmin] Header formatted for Contributor Agreement
// 0 !HISTORY 2008-07-01 [PTadmin] Official Update 2008-01
// 
// 
// 1 16 0 4 0 1 0 0 0 -5 0 0 0 1 stud3.dat
  [1,16,0,4,0,1,0,0,0,-5,0,0,0,1, ldraw_lib__stud3(realsolid)],
// 0 BFC INVERTNEXT
  [0,"BFC","INVERTNEXT"],
// 1 16 0 24 0 16 0 0 0 -20 0 0 0 6 box5.dat
  [1,16,0,24,0,16,0,0,0,-20,0,0,0,6, ldraw_lib__box5(realsolid)],
// 4 16 20 24 10 16 24 6 -16 24 6 -20 24 10
  [4,16,20,24,10,16,24,6,-16,24,6,-20,24,10],
// 4 16 -20 24 10 -16 24 6 -16 24 -6 -20 24 -10
  [4,16,-20,24,10,-16,24,6,-16,24,-6,-20,24,-10],
// 4 16 -20 24 -10 -16 24 -6 16 24 -6 20 24 -10
  [4,16,-20,24,-10,-16,24,-6,16,24,-6,20,24,-10],
// 4 16 20 24 -10 16 24 -6 16 24 6 20 24 10
  [4,16,20,24,-10,16,24,-6,16,24,6,20,24,10],
// 1 16 0 24 0 20 0 0 0 -24 0 0 0 10 box4t.dat
  [1,16,0,24,0,20,0,0,0,-24,0,0,0,10, ldraw_lib__box4t(realsolid)],
// 1 16 10 0 0 1 0 0 0 1 0 0 0 1 stud.dat
  [1,16,10,0,0,1,0,0,0,1,0,0,0,1, ldraw_lib__stud(realsolid)],
// 1 16 -10 0 0 1 0 0 0 1 0 0 0 1 stud.dat
  [1,16,-10,0,0,1,0,0,0,1,0,0,0,1, ldraw_lib__stud(realsolid)],
// 0
];
module ldraw_lib__s__3004s01(step=0, col=false, unit=2/5, alt=false, line=0.2, solid=!$preview)
    makepoly(ldraw_lib__s__3004s01(solid), step=step, col=col, unit=unit, alt=alt, line=line, solid=solid);
ldraw_lib__s__3004s01(line=0.2);
// file: s/3005s01.scad
use <../../lib.scad>
use <../../p/box4t.scad>
use <../../p/box5.scad>
use <../../p/stud.scad>
$fa=1; $fs=0.2;
function ldraw_lib__s__3005s01(realsolid=false) = [
// 0 ~Brick  1 x  1 without Front Face
// 0 Name: s\3005s01.dat
// 0 Author: John Riley [jriley]
// 0 !LDRAW_ORG Subpart UPDATE 2004-01
// 0 !LICENSE Licensed under CC BY 2.0 and CC BY 4.0 : see CAreadme.txt
// 
// 0 BFC CERTIFY CCW
  [0,"BFC","CERTIFY"],
  [0,"BFC","CCW"],
// 
// 0 !HISTORY 2003-09-07 [jriley] BFCed & Subfiled
// 0 !HISTORY 2004-03-02 [PTadmin] Official Update 2004-01
// 0 !HISTORY 2007-08-29 [PTadmin] Header formatted for Contributor Agreement
// 0 !HISTORY 2008-07-01 [PTadmin] Official Update 2008-01
// 
// 
// 0 BFC INVERTNEXT
  [0,"BFC","INVERTNEXT"],
// 1 16 0 24 0 0 0 6 0 -20 0 -6 0 0 box5.dat
  [1,16,0,24,0,0,0,6,0,-20,0,-6,0,0, ldraw_lib__box5(realsolid)],
// 4 16 10 24 -10 6 24 -6 6 24 6 10 24 10
  [4,16,10,24,-10,6,24,-6,6,24,6,10,24,10],
// 4 16 10 24 10 6 24 6 -6 24 6 -10 24 10
  [4,16,10,24,10,6,24,6,-6,24,6,-10,24,10],
// 4 16 -10 24 10 -6 24 6 -6 24 -6 -10 24 -10
  [4,16,-10,24,10,-6,24,6,-6,24,-6,-10,24,-10],
// 4 16 -10 24 -10 -6 24 -6 6 24 -6 10 24 -10
  [4,16,-10,24,-10,-6,24,-6,6,24,-6,10,24,-10],
// 1 16 0 24 0 10 0 0 0 -24 0 0 0 10 box4t.dat
  [1,16,0,24,0,10,0,0,0,-24,0,0,0,10, ldraw_lib__box4t(realsolid)],
// 1 16 0 0 0 0 0 1 0 1 0 -1 0 0 stud.dat
  [1,16,0,0,0,0,0,1,0,1,0,-1,0,0, ldraw_lib__stud(realsolid)],
// 0
];
module ldraw_lib__s__3005s01(step=0, col=false, unit=2/5, alt=false, line=0.2, solid=!$preview)
    makepoly(ldraw_lib__s__3005s01(solid), step=step, col=col, unit=unit, alt=alt, line=line, solid=solid);
ldraw_lib__s__3005s01(line=0.2);
// file: 3004.scad
use <../lib.scad>
use <s/3004s01.scad>
$fa=1; $fs=0.2;
function ldraw_lib__3004(realsolid=false) = [
// 0 Brick  1 x  2
// 0 Name: 3004.dat
// 0 Author: James Jessiman
// 0 !LDRAW_ORG Part UPDATE 2022-05
// 0 !LICENSE Licensed under CC BY 2.0 and CC BY 4.0 : see CAreadme.txt
// 
// 0 BFC CERTIFY CCW
  [0,"BFC","CERTIFY"],
  [0,"BFC","CCW"],
// 
// 0 !HISTORY 2001-10-26 [PTadmin] Official Update 2001-01
// 0 !HISTORY 2002-05-07 {unknown} BFC Certification
// 0 !HISTORY 2002-06-11 [PTadmin] Official Update 2002-03
// 0 !HISTORY 2007-05-07 [PTadmin] Header formatted for Contributor Agreement
// 0 !HISTORY 2008-07-01 [PTadmin] Official Update 2008-01
// 0 !HISTORY 2022-08-04 [MagFors] Using subfile
// 0 !HISTORY 2022-09-15 [PTadmin] Official Update 2022-05
// 
// 
// 1 16 0 0 0 1 0 0 0 1 0 0 0 1 s\3004s01.dat
  [1,16,0,0,0,1,0,0,0,1,0,0,0,1, ldraw_lib__s__3004s01(realsolid)],
// 4 16 -20 24 -10 20 24 -10 20 0 -10 -20 0 -10
  [4,16,-20,24,-10,20,24,-10,20,0,-10,-20,0,-10],
];
module ldraw_lib__3004(step=0, col=false, unit=2/5, alt=false, line=0.2, solid=!$preview)
    makepoly(ldraw_lib__3004(solid), step=step, col=col, unit=unit, alt=alt, line=line, solid=solid);
ldraw_lib__3004(line=0.2);
// file: 3005ptx.scad
use <../lib.scad>
use <s/3005s01.scad>
$fa=1; $fs=0.2;
function ldraw_lib__3005ptx(realsolid=false) = [
// 0 Brick  1 x  1 with Blue "X" Pattern
// 0 Name: 3005ptx.dat
// 0 Author: Tore Eriksson [Tore_Eriksson]
// 0 !LDRAW_ORG Part UPDATE 2004-03
// 0 !LICENSE Licensed under CC BY 2.0 and CC BY 4.0 : see CAreadme.txt
// 
// 0 BFC CERTIFY CW
  [0,"BFC","CERTIFY"],
  [0,"BFC","CW"],
// 
// 0 !HISTORY 2003-12-09 [Steffen] made use of existing subfile
// 0 !HISTORY 2004-09-15 [PTadmin] Official Update 2004-03
// 0 !HISTORY 2007-05-11 [PTadmin] Header formatted for Contributor Agreement
// 0 !HISTORY 2008-07-01 [PTadmin] Official Update 2008-01
// 
// 
// 1 16 0 0 0 1 0 0 0 1 0 0 0 1 s\3005s01.dat
  [1,16,0,0,0,1,0,0,0,1,0,0,0,1, ldraw_lib__s__3005s01(realsolid)],
// 4 1 0 13.1 -10 1 11.6 -10 6 19 -10 4 19 -10
  [4,1,0,13.1,-10,1,11.6,-10,6,19,-10,4,19,-10],
// 4 1 -5.5 5 -10 -3.5 5 -10 0 10.2 -10 -1 11.6 -10
  [4,1,-5.5,5,-10,-3.5,5,-10,0,10.2,-10,-1,11.6,-10],
// 4 1 -6 19 -10 -1 11.6 -10 0 13.1 -10 -4 19 -10
  [4,1,-6,19,-10,-1,11.6,-10,0,13.1,-10,-4,19,-10],
// 4 1 0 10.2 -10 3.5 5 -10 5.5 5 -10 1 11.6 -10
  [4,1,0,10.2,-10,3.5,5,-10,5.5,5,-10,1,11.6,-10],
// 4 1 0 13.1 -10 -1 11.6 -10 0 10.2 -10 1 11.6 -10
  [4,1,0,13.1,-10,-1,11.6,-10,0,10.2,-10,1,11.6,-10],
// 4 16 -10 0 -10 -5.5 5 -10 -6 19 -10 -10 24 -10
  [4,16,-10,0,-10,-5.5,5,-10,-6,19,-10,-10,24,-10],
// 4 16 -10 24 -10 -6 19 -10 6 19 -10 10 24 -10
  [4,16,-10,24,-10,-6,19,-10,6,19,-10,10,24,-10],
// 4 16 10 24 -10 6 19 -10 5.5 5 -10 10 0 -10
  [4,16,10,24,-10,6,19,-10,5.5,5,-10,10,0,-10],
// 4 16 10 0 -10 5.5 5 -10 -5.5 5 -10 -10 0 -10
  [4,16,10,0,-10,5.5,5,-10,-5.5,5,-10,-10,0,-10],
// 3 16 -5.5 5 -10 -1 11.6 -10 -6 19 -10
  [3,16,-5.5,5,-10,-1,11.6,-10,-6,19,-10],
// 3 16 -4 19 -10 0 13.1 -10 4 19 -10
  [3,16,-4,19,-10,0,13.1,-10,4,19,-10],
// 3 16 6 19 -10 1 11.6 -10 5.5 5 -10
  [3,16,6,19,-10,1,11.6,-10,5.5,5,-10],
// 3 16 3.5 5 -10 0 10.2 -10 -3.5 5 -10
  [3,16,3.5,5,-10,0,10.2,-10,-3.5,5,-10],
// 0
];
module ldraw_lib__3005ptx(step=0, col=false, unit=2/5, alt=false, line=0.2, solid=!$preview)
    makepoly(ldraw_lib__3005ptx(solid), step=step, col=col, unit=unit, alt=alt, line=line, solid=solid);
ldraw_lib__3005ptx(line=0.2);
// main file
use <../lib.scad>
use <3005ptx.scad>
$fa=1; $fs=0.2;
function ldraw_lib__3005_x(realsolid=false) = [
// 0 ~Moved to 3005ptx
// 0 Name: 3005-x.dat
// 0 Author: [PTadmin]
// 0 !LDRAW_ORG Part UPDATE 2004-03
// 0 !LICENSE Licensed under CC BY 4.0 : see CAreadme.txt
// 
// 0 BFC CERTIFY CCW
  [0,"BFC","CERTIFY"],
  [0,"BFC","CCW"],
// 
// 0 !HISTORY 1998-12-15 [PTadmin] Official Update 1998-10
// 0 !HISTORY 2004-09-15 [PTadmin] Official Update 2004-03
// 0 !HISTORY 2007-05-11 [PTadmin] Header formatted for Contributor Agreement
// 0 !HISTORY 2008-07-01 [PTadmin] Official Update 2008-01
// 
// 
// 1 16 0 0 0 1 0 0 0 1 0 0 0 1 3005ptx.dat
  [1,16,0,0,0,1,0,0,0,1,0,0,0,1, ldraw_lib__3005ptx(realsolid)],
];
module ldraw_lib__3005_x(step=0, col=false, unit=2/5, alt=false, line=0.2, solid=!$preview)
    makepoly(ldraw_lib__3005_x(solid), step=step, col=col, unit=unit, alt=alt, line=line, solid=solid);
ldraw_lib__3005_x(line=0.2);
